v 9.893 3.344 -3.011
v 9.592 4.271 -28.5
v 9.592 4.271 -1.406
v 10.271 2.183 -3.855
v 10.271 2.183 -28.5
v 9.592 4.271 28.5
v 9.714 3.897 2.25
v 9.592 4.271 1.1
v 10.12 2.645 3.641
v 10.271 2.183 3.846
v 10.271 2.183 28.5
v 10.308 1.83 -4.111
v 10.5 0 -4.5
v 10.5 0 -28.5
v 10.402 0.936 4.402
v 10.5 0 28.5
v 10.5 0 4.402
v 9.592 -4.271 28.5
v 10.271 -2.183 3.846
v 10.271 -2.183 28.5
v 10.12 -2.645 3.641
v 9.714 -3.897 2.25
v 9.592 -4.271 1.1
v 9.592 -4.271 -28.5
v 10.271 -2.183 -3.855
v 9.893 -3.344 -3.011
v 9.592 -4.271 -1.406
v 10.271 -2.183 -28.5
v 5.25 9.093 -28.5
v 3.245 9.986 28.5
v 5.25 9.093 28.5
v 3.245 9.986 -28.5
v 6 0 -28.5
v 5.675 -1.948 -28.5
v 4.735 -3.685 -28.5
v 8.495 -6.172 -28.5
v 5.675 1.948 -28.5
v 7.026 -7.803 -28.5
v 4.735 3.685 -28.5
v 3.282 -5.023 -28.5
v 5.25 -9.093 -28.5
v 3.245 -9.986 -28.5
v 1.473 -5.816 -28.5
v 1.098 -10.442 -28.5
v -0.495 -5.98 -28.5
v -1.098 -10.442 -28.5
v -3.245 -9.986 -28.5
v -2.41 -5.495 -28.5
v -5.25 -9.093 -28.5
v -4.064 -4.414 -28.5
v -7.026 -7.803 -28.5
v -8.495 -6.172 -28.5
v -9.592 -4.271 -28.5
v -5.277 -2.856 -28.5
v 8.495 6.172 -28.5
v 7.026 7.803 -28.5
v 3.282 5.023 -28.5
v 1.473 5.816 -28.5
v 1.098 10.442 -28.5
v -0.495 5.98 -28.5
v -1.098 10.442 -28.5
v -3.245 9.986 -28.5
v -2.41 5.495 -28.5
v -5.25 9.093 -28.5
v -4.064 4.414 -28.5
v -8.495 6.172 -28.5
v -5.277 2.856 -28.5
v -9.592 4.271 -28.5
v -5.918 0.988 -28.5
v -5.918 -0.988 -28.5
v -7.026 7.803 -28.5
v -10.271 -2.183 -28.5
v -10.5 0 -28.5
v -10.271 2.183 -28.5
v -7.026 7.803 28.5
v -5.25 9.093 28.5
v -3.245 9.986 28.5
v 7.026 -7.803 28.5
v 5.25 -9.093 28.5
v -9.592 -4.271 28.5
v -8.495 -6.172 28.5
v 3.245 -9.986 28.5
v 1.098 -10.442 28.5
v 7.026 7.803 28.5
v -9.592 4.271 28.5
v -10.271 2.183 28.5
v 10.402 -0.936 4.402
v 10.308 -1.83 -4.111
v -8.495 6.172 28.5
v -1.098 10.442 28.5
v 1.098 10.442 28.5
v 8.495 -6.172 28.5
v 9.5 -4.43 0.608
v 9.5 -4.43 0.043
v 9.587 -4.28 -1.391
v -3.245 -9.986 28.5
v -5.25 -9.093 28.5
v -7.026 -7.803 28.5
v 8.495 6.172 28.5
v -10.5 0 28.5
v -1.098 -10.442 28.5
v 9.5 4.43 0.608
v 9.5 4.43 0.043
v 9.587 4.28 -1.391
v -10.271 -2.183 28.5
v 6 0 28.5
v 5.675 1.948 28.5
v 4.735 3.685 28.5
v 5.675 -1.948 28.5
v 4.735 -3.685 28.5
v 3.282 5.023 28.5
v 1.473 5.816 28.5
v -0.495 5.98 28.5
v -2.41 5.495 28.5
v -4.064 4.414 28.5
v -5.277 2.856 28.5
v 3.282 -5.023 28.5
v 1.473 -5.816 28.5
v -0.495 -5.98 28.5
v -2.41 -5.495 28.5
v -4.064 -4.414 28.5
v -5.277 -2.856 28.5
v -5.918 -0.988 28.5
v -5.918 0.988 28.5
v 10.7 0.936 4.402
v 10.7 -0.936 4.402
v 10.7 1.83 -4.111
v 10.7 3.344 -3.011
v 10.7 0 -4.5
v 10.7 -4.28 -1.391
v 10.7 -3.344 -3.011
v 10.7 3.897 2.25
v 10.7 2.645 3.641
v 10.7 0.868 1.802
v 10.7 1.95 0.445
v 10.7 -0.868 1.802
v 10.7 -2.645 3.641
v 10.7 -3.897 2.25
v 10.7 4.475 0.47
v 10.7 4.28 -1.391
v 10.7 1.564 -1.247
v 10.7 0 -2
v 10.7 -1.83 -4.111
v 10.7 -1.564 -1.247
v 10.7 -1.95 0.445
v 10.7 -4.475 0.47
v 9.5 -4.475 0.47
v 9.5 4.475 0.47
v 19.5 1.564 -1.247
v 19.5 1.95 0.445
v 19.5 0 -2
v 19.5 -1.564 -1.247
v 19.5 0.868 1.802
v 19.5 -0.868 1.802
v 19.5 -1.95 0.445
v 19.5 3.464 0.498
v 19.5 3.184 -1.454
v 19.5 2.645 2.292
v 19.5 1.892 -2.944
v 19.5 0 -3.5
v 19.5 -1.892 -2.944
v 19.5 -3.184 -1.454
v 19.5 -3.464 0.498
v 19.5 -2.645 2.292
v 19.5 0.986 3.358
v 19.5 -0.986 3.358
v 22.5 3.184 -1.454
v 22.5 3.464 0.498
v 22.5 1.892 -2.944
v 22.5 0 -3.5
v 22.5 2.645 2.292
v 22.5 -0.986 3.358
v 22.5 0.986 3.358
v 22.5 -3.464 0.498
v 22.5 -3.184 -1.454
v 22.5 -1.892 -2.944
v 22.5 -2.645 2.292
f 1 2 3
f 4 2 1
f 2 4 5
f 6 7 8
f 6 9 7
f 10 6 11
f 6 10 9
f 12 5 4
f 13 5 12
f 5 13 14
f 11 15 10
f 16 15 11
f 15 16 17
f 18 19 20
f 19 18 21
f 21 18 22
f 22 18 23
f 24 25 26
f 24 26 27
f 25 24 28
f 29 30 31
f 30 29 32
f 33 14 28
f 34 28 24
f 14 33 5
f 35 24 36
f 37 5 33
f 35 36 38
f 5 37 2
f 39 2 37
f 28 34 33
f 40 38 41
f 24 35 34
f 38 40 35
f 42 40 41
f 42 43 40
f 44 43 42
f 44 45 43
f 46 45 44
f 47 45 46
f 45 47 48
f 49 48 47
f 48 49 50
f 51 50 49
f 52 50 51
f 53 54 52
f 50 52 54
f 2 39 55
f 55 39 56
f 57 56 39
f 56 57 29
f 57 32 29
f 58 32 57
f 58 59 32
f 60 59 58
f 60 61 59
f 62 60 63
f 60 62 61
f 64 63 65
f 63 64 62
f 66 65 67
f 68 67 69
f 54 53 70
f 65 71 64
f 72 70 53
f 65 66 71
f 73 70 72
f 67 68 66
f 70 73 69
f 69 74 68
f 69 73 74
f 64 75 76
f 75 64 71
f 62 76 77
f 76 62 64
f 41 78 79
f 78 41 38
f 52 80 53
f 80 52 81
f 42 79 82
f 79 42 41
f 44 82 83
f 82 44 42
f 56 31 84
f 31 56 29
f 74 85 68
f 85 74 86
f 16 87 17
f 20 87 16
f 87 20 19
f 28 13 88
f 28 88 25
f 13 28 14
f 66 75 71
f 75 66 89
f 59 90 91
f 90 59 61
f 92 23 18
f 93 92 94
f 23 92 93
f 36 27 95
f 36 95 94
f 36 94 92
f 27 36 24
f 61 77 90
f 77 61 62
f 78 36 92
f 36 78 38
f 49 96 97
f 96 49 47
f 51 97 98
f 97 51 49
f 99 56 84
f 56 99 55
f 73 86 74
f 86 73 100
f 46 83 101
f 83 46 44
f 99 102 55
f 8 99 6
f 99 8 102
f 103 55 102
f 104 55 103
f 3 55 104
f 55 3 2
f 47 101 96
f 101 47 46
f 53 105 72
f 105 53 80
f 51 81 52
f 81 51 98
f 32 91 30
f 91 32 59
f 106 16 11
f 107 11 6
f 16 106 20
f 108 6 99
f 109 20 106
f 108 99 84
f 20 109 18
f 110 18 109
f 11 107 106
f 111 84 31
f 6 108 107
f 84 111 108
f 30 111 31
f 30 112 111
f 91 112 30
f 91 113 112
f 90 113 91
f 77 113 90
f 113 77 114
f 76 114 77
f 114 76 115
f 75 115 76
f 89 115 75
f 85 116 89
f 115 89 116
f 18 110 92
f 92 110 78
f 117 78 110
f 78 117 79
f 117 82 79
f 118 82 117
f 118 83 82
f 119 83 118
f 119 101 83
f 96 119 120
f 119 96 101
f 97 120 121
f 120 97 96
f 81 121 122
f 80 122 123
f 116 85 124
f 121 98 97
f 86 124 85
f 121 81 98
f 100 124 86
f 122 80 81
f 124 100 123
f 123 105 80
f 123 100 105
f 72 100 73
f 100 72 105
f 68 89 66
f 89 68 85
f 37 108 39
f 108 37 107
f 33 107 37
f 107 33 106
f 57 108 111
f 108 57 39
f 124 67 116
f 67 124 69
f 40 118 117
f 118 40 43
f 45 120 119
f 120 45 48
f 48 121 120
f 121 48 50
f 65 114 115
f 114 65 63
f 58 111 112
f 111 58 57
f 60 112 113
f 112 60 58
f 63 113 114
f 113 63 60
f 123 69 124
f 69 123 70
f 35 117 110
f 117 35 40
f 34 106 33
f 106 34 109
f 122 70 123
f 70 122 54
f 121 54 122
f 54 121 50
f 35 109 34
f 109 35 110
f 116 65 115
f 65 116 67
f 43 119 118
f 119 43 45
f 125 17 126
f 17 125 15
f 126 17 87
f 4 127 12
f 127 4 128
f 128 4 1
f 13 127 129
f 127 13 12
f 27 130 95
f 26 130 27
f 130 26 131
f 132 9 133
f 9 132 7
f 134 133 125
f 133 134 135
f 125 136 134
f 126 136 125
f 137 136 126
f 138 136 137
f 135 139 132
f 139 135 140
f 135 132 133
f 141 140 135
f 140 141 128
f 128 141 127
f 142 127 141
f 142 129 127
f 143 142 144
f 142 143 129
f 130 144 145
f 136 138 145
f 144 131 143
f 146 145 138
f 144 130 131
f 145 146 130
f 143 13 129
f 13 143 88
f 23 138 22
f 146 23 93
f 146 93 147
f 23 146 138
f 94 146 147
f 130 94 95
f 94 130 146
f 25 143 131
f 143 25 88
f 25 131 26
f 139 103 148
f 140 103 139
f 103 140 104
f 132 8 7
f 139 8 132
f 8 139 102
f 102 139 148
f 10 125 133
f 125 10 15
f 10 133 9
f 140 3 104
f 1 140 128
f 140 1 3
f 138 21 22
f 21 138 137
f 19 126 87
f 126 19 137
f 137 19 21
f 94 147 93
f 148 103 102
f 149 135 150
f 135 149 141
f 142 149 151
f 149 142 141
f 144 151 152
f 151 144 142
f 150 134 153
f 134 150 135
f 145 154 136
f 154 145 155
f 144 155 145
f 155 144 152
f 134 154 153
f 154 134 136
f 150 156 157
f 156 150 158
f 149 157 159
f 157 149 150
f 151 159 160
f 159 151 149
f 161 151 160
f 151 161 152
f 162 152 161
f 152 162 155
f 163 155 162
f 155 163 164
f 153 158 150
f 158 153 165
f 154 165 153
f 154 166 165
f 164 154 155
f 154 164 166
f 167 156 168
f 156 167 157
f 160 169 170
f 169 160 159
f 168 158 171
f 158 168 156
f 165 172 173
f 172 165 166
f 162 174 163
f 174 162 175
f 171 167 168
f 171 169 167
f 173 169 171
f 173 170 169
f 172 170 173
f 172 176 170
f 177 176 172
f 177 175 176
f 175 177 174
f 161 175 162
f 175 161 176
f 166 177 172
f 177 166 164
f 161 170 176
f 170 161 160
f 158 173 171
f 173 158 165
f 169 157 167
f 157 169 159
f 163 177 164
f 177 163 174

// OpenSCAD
// Parameters
bore_diameter_mm = 12; //[6:24:0.1]
outer_diameter_mm = 21; //[10.5:42:0.1]
length_mm = 57; //[28.5:114:0.1]
overlap_mm = 1; //[0.5:2:0.1]
screw_shank_diameter_mm = 4; //[2:8:0.1]
screw_length_mm = 10; //[5:25:0.1]
screw_head_diameter_mm = 7; //[4:14:0.1]
screw_head_height_mm = 3; //[1.5:6:0.1]
washer_outer_diameter_mm = 9; //[5:18:0.1]
washer_thickness_mm = 1.2; //[0.6:3:0.1]
screw_z_offset_mm = 0; //[-20:20:0.1]

// Linear Bearing - complete geometry
module linear_bearing() {
  color("DimGray") {
    difference() {
      // Outer cylindrical casing
      cylinder(r=outer_diameter_mm/2, h=length_mm, center=true);
      // Through bore
      cylinder(r=bore_diameter_mm/2, h=length_mm + 2*overlap_mm, center=true);
    }
  }
}

// Screw and Washer - complete geometry
module screw_and_washer() {
  color("Silver") {
    union() {
      // Screw shank
      translate([outer_diameter_mm/2 + screw_length_mm/2 - overlap_mm, 0, screw_z_offset_mm])
        rotate([0, 90, 0])
        cylinder(r=screw_shank_diameter_mm/2, h=screw_length_mm, center=true);
      
      // Washer
      translate([outer_diameter_mm/2 - overlap_mm + washer_thickness_mm/2, 0, screw_z_offset_mm])
        rotate([0, 90, 0])
        difference() {
          cylinder(r=washer_outer_diameter_mm/2, h=washer_thickness_mm, center=true);
          cylinder(r=screw_shank_diameter_mm/2, h=washer_thickness_mm + 2*overlap_mm, center=true);
        }
      
      // Screw head
      translate([outer_diameter_mm/2 + screw_length_mm - overlap_mm + screw_head_height_mm/2, 0, screw_z_offset_mm])
        rotate([0, 90, 0])
        cylinder(r=screw_head_diameter_mm/2, h=screw_head_height_mm, center=true);
    }
  }
}

// Assembly
module assembly() {
  linear_bearing();
  screw_and_washer();
}

assembly();
